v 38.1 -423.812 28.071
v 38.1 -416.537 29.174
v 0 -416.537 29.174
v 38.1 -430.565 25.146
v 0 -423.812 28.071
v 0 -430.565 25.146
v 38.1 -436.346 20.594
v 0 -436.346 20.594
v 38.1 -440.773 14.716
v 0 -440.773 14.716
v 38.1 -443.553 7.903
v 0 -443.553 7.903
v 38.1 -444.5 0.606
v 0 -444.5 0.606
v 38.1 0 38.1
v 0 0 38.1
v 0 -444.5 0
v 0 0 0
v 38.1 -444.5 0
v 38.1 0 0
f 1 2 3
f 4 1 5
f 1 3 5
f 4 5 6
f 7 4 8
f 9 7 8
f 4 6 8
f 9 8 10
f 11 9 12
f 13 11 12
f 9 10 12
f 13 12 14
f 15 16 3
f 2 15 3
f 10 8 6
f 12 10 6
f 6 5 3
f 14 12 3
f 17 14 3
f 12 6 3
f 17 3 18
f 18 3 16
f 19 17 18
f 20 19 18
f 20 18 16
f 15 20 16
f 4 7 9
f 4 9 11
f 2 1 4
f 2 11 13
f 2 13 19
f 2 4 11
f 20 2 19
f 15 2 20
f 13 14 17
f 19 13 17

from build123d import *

# Parameters (mm, degrees)
F1_DEPTH = 38.1


with BuildPart() as f1:
    # F0 (on Right) → F1 (new body)
    with BuildSketch(Plane.YZ):
        with BuildLine():
            Line((-444.5, 0), (0, 0))
            Line((0, 0), (0, 38.1))
            Line((0, 38.1), (-416.537181, 29.174203))
            ThreePointArc((-416.537181, 29.174203), (-436.345868, 20.593727), (-444.5, 0.605762))
            Line((-444.5, 0.605762), (-444.5, 0))
        make_face()
    extrude(amount=F1_DEPTH)


solid = f1.part
